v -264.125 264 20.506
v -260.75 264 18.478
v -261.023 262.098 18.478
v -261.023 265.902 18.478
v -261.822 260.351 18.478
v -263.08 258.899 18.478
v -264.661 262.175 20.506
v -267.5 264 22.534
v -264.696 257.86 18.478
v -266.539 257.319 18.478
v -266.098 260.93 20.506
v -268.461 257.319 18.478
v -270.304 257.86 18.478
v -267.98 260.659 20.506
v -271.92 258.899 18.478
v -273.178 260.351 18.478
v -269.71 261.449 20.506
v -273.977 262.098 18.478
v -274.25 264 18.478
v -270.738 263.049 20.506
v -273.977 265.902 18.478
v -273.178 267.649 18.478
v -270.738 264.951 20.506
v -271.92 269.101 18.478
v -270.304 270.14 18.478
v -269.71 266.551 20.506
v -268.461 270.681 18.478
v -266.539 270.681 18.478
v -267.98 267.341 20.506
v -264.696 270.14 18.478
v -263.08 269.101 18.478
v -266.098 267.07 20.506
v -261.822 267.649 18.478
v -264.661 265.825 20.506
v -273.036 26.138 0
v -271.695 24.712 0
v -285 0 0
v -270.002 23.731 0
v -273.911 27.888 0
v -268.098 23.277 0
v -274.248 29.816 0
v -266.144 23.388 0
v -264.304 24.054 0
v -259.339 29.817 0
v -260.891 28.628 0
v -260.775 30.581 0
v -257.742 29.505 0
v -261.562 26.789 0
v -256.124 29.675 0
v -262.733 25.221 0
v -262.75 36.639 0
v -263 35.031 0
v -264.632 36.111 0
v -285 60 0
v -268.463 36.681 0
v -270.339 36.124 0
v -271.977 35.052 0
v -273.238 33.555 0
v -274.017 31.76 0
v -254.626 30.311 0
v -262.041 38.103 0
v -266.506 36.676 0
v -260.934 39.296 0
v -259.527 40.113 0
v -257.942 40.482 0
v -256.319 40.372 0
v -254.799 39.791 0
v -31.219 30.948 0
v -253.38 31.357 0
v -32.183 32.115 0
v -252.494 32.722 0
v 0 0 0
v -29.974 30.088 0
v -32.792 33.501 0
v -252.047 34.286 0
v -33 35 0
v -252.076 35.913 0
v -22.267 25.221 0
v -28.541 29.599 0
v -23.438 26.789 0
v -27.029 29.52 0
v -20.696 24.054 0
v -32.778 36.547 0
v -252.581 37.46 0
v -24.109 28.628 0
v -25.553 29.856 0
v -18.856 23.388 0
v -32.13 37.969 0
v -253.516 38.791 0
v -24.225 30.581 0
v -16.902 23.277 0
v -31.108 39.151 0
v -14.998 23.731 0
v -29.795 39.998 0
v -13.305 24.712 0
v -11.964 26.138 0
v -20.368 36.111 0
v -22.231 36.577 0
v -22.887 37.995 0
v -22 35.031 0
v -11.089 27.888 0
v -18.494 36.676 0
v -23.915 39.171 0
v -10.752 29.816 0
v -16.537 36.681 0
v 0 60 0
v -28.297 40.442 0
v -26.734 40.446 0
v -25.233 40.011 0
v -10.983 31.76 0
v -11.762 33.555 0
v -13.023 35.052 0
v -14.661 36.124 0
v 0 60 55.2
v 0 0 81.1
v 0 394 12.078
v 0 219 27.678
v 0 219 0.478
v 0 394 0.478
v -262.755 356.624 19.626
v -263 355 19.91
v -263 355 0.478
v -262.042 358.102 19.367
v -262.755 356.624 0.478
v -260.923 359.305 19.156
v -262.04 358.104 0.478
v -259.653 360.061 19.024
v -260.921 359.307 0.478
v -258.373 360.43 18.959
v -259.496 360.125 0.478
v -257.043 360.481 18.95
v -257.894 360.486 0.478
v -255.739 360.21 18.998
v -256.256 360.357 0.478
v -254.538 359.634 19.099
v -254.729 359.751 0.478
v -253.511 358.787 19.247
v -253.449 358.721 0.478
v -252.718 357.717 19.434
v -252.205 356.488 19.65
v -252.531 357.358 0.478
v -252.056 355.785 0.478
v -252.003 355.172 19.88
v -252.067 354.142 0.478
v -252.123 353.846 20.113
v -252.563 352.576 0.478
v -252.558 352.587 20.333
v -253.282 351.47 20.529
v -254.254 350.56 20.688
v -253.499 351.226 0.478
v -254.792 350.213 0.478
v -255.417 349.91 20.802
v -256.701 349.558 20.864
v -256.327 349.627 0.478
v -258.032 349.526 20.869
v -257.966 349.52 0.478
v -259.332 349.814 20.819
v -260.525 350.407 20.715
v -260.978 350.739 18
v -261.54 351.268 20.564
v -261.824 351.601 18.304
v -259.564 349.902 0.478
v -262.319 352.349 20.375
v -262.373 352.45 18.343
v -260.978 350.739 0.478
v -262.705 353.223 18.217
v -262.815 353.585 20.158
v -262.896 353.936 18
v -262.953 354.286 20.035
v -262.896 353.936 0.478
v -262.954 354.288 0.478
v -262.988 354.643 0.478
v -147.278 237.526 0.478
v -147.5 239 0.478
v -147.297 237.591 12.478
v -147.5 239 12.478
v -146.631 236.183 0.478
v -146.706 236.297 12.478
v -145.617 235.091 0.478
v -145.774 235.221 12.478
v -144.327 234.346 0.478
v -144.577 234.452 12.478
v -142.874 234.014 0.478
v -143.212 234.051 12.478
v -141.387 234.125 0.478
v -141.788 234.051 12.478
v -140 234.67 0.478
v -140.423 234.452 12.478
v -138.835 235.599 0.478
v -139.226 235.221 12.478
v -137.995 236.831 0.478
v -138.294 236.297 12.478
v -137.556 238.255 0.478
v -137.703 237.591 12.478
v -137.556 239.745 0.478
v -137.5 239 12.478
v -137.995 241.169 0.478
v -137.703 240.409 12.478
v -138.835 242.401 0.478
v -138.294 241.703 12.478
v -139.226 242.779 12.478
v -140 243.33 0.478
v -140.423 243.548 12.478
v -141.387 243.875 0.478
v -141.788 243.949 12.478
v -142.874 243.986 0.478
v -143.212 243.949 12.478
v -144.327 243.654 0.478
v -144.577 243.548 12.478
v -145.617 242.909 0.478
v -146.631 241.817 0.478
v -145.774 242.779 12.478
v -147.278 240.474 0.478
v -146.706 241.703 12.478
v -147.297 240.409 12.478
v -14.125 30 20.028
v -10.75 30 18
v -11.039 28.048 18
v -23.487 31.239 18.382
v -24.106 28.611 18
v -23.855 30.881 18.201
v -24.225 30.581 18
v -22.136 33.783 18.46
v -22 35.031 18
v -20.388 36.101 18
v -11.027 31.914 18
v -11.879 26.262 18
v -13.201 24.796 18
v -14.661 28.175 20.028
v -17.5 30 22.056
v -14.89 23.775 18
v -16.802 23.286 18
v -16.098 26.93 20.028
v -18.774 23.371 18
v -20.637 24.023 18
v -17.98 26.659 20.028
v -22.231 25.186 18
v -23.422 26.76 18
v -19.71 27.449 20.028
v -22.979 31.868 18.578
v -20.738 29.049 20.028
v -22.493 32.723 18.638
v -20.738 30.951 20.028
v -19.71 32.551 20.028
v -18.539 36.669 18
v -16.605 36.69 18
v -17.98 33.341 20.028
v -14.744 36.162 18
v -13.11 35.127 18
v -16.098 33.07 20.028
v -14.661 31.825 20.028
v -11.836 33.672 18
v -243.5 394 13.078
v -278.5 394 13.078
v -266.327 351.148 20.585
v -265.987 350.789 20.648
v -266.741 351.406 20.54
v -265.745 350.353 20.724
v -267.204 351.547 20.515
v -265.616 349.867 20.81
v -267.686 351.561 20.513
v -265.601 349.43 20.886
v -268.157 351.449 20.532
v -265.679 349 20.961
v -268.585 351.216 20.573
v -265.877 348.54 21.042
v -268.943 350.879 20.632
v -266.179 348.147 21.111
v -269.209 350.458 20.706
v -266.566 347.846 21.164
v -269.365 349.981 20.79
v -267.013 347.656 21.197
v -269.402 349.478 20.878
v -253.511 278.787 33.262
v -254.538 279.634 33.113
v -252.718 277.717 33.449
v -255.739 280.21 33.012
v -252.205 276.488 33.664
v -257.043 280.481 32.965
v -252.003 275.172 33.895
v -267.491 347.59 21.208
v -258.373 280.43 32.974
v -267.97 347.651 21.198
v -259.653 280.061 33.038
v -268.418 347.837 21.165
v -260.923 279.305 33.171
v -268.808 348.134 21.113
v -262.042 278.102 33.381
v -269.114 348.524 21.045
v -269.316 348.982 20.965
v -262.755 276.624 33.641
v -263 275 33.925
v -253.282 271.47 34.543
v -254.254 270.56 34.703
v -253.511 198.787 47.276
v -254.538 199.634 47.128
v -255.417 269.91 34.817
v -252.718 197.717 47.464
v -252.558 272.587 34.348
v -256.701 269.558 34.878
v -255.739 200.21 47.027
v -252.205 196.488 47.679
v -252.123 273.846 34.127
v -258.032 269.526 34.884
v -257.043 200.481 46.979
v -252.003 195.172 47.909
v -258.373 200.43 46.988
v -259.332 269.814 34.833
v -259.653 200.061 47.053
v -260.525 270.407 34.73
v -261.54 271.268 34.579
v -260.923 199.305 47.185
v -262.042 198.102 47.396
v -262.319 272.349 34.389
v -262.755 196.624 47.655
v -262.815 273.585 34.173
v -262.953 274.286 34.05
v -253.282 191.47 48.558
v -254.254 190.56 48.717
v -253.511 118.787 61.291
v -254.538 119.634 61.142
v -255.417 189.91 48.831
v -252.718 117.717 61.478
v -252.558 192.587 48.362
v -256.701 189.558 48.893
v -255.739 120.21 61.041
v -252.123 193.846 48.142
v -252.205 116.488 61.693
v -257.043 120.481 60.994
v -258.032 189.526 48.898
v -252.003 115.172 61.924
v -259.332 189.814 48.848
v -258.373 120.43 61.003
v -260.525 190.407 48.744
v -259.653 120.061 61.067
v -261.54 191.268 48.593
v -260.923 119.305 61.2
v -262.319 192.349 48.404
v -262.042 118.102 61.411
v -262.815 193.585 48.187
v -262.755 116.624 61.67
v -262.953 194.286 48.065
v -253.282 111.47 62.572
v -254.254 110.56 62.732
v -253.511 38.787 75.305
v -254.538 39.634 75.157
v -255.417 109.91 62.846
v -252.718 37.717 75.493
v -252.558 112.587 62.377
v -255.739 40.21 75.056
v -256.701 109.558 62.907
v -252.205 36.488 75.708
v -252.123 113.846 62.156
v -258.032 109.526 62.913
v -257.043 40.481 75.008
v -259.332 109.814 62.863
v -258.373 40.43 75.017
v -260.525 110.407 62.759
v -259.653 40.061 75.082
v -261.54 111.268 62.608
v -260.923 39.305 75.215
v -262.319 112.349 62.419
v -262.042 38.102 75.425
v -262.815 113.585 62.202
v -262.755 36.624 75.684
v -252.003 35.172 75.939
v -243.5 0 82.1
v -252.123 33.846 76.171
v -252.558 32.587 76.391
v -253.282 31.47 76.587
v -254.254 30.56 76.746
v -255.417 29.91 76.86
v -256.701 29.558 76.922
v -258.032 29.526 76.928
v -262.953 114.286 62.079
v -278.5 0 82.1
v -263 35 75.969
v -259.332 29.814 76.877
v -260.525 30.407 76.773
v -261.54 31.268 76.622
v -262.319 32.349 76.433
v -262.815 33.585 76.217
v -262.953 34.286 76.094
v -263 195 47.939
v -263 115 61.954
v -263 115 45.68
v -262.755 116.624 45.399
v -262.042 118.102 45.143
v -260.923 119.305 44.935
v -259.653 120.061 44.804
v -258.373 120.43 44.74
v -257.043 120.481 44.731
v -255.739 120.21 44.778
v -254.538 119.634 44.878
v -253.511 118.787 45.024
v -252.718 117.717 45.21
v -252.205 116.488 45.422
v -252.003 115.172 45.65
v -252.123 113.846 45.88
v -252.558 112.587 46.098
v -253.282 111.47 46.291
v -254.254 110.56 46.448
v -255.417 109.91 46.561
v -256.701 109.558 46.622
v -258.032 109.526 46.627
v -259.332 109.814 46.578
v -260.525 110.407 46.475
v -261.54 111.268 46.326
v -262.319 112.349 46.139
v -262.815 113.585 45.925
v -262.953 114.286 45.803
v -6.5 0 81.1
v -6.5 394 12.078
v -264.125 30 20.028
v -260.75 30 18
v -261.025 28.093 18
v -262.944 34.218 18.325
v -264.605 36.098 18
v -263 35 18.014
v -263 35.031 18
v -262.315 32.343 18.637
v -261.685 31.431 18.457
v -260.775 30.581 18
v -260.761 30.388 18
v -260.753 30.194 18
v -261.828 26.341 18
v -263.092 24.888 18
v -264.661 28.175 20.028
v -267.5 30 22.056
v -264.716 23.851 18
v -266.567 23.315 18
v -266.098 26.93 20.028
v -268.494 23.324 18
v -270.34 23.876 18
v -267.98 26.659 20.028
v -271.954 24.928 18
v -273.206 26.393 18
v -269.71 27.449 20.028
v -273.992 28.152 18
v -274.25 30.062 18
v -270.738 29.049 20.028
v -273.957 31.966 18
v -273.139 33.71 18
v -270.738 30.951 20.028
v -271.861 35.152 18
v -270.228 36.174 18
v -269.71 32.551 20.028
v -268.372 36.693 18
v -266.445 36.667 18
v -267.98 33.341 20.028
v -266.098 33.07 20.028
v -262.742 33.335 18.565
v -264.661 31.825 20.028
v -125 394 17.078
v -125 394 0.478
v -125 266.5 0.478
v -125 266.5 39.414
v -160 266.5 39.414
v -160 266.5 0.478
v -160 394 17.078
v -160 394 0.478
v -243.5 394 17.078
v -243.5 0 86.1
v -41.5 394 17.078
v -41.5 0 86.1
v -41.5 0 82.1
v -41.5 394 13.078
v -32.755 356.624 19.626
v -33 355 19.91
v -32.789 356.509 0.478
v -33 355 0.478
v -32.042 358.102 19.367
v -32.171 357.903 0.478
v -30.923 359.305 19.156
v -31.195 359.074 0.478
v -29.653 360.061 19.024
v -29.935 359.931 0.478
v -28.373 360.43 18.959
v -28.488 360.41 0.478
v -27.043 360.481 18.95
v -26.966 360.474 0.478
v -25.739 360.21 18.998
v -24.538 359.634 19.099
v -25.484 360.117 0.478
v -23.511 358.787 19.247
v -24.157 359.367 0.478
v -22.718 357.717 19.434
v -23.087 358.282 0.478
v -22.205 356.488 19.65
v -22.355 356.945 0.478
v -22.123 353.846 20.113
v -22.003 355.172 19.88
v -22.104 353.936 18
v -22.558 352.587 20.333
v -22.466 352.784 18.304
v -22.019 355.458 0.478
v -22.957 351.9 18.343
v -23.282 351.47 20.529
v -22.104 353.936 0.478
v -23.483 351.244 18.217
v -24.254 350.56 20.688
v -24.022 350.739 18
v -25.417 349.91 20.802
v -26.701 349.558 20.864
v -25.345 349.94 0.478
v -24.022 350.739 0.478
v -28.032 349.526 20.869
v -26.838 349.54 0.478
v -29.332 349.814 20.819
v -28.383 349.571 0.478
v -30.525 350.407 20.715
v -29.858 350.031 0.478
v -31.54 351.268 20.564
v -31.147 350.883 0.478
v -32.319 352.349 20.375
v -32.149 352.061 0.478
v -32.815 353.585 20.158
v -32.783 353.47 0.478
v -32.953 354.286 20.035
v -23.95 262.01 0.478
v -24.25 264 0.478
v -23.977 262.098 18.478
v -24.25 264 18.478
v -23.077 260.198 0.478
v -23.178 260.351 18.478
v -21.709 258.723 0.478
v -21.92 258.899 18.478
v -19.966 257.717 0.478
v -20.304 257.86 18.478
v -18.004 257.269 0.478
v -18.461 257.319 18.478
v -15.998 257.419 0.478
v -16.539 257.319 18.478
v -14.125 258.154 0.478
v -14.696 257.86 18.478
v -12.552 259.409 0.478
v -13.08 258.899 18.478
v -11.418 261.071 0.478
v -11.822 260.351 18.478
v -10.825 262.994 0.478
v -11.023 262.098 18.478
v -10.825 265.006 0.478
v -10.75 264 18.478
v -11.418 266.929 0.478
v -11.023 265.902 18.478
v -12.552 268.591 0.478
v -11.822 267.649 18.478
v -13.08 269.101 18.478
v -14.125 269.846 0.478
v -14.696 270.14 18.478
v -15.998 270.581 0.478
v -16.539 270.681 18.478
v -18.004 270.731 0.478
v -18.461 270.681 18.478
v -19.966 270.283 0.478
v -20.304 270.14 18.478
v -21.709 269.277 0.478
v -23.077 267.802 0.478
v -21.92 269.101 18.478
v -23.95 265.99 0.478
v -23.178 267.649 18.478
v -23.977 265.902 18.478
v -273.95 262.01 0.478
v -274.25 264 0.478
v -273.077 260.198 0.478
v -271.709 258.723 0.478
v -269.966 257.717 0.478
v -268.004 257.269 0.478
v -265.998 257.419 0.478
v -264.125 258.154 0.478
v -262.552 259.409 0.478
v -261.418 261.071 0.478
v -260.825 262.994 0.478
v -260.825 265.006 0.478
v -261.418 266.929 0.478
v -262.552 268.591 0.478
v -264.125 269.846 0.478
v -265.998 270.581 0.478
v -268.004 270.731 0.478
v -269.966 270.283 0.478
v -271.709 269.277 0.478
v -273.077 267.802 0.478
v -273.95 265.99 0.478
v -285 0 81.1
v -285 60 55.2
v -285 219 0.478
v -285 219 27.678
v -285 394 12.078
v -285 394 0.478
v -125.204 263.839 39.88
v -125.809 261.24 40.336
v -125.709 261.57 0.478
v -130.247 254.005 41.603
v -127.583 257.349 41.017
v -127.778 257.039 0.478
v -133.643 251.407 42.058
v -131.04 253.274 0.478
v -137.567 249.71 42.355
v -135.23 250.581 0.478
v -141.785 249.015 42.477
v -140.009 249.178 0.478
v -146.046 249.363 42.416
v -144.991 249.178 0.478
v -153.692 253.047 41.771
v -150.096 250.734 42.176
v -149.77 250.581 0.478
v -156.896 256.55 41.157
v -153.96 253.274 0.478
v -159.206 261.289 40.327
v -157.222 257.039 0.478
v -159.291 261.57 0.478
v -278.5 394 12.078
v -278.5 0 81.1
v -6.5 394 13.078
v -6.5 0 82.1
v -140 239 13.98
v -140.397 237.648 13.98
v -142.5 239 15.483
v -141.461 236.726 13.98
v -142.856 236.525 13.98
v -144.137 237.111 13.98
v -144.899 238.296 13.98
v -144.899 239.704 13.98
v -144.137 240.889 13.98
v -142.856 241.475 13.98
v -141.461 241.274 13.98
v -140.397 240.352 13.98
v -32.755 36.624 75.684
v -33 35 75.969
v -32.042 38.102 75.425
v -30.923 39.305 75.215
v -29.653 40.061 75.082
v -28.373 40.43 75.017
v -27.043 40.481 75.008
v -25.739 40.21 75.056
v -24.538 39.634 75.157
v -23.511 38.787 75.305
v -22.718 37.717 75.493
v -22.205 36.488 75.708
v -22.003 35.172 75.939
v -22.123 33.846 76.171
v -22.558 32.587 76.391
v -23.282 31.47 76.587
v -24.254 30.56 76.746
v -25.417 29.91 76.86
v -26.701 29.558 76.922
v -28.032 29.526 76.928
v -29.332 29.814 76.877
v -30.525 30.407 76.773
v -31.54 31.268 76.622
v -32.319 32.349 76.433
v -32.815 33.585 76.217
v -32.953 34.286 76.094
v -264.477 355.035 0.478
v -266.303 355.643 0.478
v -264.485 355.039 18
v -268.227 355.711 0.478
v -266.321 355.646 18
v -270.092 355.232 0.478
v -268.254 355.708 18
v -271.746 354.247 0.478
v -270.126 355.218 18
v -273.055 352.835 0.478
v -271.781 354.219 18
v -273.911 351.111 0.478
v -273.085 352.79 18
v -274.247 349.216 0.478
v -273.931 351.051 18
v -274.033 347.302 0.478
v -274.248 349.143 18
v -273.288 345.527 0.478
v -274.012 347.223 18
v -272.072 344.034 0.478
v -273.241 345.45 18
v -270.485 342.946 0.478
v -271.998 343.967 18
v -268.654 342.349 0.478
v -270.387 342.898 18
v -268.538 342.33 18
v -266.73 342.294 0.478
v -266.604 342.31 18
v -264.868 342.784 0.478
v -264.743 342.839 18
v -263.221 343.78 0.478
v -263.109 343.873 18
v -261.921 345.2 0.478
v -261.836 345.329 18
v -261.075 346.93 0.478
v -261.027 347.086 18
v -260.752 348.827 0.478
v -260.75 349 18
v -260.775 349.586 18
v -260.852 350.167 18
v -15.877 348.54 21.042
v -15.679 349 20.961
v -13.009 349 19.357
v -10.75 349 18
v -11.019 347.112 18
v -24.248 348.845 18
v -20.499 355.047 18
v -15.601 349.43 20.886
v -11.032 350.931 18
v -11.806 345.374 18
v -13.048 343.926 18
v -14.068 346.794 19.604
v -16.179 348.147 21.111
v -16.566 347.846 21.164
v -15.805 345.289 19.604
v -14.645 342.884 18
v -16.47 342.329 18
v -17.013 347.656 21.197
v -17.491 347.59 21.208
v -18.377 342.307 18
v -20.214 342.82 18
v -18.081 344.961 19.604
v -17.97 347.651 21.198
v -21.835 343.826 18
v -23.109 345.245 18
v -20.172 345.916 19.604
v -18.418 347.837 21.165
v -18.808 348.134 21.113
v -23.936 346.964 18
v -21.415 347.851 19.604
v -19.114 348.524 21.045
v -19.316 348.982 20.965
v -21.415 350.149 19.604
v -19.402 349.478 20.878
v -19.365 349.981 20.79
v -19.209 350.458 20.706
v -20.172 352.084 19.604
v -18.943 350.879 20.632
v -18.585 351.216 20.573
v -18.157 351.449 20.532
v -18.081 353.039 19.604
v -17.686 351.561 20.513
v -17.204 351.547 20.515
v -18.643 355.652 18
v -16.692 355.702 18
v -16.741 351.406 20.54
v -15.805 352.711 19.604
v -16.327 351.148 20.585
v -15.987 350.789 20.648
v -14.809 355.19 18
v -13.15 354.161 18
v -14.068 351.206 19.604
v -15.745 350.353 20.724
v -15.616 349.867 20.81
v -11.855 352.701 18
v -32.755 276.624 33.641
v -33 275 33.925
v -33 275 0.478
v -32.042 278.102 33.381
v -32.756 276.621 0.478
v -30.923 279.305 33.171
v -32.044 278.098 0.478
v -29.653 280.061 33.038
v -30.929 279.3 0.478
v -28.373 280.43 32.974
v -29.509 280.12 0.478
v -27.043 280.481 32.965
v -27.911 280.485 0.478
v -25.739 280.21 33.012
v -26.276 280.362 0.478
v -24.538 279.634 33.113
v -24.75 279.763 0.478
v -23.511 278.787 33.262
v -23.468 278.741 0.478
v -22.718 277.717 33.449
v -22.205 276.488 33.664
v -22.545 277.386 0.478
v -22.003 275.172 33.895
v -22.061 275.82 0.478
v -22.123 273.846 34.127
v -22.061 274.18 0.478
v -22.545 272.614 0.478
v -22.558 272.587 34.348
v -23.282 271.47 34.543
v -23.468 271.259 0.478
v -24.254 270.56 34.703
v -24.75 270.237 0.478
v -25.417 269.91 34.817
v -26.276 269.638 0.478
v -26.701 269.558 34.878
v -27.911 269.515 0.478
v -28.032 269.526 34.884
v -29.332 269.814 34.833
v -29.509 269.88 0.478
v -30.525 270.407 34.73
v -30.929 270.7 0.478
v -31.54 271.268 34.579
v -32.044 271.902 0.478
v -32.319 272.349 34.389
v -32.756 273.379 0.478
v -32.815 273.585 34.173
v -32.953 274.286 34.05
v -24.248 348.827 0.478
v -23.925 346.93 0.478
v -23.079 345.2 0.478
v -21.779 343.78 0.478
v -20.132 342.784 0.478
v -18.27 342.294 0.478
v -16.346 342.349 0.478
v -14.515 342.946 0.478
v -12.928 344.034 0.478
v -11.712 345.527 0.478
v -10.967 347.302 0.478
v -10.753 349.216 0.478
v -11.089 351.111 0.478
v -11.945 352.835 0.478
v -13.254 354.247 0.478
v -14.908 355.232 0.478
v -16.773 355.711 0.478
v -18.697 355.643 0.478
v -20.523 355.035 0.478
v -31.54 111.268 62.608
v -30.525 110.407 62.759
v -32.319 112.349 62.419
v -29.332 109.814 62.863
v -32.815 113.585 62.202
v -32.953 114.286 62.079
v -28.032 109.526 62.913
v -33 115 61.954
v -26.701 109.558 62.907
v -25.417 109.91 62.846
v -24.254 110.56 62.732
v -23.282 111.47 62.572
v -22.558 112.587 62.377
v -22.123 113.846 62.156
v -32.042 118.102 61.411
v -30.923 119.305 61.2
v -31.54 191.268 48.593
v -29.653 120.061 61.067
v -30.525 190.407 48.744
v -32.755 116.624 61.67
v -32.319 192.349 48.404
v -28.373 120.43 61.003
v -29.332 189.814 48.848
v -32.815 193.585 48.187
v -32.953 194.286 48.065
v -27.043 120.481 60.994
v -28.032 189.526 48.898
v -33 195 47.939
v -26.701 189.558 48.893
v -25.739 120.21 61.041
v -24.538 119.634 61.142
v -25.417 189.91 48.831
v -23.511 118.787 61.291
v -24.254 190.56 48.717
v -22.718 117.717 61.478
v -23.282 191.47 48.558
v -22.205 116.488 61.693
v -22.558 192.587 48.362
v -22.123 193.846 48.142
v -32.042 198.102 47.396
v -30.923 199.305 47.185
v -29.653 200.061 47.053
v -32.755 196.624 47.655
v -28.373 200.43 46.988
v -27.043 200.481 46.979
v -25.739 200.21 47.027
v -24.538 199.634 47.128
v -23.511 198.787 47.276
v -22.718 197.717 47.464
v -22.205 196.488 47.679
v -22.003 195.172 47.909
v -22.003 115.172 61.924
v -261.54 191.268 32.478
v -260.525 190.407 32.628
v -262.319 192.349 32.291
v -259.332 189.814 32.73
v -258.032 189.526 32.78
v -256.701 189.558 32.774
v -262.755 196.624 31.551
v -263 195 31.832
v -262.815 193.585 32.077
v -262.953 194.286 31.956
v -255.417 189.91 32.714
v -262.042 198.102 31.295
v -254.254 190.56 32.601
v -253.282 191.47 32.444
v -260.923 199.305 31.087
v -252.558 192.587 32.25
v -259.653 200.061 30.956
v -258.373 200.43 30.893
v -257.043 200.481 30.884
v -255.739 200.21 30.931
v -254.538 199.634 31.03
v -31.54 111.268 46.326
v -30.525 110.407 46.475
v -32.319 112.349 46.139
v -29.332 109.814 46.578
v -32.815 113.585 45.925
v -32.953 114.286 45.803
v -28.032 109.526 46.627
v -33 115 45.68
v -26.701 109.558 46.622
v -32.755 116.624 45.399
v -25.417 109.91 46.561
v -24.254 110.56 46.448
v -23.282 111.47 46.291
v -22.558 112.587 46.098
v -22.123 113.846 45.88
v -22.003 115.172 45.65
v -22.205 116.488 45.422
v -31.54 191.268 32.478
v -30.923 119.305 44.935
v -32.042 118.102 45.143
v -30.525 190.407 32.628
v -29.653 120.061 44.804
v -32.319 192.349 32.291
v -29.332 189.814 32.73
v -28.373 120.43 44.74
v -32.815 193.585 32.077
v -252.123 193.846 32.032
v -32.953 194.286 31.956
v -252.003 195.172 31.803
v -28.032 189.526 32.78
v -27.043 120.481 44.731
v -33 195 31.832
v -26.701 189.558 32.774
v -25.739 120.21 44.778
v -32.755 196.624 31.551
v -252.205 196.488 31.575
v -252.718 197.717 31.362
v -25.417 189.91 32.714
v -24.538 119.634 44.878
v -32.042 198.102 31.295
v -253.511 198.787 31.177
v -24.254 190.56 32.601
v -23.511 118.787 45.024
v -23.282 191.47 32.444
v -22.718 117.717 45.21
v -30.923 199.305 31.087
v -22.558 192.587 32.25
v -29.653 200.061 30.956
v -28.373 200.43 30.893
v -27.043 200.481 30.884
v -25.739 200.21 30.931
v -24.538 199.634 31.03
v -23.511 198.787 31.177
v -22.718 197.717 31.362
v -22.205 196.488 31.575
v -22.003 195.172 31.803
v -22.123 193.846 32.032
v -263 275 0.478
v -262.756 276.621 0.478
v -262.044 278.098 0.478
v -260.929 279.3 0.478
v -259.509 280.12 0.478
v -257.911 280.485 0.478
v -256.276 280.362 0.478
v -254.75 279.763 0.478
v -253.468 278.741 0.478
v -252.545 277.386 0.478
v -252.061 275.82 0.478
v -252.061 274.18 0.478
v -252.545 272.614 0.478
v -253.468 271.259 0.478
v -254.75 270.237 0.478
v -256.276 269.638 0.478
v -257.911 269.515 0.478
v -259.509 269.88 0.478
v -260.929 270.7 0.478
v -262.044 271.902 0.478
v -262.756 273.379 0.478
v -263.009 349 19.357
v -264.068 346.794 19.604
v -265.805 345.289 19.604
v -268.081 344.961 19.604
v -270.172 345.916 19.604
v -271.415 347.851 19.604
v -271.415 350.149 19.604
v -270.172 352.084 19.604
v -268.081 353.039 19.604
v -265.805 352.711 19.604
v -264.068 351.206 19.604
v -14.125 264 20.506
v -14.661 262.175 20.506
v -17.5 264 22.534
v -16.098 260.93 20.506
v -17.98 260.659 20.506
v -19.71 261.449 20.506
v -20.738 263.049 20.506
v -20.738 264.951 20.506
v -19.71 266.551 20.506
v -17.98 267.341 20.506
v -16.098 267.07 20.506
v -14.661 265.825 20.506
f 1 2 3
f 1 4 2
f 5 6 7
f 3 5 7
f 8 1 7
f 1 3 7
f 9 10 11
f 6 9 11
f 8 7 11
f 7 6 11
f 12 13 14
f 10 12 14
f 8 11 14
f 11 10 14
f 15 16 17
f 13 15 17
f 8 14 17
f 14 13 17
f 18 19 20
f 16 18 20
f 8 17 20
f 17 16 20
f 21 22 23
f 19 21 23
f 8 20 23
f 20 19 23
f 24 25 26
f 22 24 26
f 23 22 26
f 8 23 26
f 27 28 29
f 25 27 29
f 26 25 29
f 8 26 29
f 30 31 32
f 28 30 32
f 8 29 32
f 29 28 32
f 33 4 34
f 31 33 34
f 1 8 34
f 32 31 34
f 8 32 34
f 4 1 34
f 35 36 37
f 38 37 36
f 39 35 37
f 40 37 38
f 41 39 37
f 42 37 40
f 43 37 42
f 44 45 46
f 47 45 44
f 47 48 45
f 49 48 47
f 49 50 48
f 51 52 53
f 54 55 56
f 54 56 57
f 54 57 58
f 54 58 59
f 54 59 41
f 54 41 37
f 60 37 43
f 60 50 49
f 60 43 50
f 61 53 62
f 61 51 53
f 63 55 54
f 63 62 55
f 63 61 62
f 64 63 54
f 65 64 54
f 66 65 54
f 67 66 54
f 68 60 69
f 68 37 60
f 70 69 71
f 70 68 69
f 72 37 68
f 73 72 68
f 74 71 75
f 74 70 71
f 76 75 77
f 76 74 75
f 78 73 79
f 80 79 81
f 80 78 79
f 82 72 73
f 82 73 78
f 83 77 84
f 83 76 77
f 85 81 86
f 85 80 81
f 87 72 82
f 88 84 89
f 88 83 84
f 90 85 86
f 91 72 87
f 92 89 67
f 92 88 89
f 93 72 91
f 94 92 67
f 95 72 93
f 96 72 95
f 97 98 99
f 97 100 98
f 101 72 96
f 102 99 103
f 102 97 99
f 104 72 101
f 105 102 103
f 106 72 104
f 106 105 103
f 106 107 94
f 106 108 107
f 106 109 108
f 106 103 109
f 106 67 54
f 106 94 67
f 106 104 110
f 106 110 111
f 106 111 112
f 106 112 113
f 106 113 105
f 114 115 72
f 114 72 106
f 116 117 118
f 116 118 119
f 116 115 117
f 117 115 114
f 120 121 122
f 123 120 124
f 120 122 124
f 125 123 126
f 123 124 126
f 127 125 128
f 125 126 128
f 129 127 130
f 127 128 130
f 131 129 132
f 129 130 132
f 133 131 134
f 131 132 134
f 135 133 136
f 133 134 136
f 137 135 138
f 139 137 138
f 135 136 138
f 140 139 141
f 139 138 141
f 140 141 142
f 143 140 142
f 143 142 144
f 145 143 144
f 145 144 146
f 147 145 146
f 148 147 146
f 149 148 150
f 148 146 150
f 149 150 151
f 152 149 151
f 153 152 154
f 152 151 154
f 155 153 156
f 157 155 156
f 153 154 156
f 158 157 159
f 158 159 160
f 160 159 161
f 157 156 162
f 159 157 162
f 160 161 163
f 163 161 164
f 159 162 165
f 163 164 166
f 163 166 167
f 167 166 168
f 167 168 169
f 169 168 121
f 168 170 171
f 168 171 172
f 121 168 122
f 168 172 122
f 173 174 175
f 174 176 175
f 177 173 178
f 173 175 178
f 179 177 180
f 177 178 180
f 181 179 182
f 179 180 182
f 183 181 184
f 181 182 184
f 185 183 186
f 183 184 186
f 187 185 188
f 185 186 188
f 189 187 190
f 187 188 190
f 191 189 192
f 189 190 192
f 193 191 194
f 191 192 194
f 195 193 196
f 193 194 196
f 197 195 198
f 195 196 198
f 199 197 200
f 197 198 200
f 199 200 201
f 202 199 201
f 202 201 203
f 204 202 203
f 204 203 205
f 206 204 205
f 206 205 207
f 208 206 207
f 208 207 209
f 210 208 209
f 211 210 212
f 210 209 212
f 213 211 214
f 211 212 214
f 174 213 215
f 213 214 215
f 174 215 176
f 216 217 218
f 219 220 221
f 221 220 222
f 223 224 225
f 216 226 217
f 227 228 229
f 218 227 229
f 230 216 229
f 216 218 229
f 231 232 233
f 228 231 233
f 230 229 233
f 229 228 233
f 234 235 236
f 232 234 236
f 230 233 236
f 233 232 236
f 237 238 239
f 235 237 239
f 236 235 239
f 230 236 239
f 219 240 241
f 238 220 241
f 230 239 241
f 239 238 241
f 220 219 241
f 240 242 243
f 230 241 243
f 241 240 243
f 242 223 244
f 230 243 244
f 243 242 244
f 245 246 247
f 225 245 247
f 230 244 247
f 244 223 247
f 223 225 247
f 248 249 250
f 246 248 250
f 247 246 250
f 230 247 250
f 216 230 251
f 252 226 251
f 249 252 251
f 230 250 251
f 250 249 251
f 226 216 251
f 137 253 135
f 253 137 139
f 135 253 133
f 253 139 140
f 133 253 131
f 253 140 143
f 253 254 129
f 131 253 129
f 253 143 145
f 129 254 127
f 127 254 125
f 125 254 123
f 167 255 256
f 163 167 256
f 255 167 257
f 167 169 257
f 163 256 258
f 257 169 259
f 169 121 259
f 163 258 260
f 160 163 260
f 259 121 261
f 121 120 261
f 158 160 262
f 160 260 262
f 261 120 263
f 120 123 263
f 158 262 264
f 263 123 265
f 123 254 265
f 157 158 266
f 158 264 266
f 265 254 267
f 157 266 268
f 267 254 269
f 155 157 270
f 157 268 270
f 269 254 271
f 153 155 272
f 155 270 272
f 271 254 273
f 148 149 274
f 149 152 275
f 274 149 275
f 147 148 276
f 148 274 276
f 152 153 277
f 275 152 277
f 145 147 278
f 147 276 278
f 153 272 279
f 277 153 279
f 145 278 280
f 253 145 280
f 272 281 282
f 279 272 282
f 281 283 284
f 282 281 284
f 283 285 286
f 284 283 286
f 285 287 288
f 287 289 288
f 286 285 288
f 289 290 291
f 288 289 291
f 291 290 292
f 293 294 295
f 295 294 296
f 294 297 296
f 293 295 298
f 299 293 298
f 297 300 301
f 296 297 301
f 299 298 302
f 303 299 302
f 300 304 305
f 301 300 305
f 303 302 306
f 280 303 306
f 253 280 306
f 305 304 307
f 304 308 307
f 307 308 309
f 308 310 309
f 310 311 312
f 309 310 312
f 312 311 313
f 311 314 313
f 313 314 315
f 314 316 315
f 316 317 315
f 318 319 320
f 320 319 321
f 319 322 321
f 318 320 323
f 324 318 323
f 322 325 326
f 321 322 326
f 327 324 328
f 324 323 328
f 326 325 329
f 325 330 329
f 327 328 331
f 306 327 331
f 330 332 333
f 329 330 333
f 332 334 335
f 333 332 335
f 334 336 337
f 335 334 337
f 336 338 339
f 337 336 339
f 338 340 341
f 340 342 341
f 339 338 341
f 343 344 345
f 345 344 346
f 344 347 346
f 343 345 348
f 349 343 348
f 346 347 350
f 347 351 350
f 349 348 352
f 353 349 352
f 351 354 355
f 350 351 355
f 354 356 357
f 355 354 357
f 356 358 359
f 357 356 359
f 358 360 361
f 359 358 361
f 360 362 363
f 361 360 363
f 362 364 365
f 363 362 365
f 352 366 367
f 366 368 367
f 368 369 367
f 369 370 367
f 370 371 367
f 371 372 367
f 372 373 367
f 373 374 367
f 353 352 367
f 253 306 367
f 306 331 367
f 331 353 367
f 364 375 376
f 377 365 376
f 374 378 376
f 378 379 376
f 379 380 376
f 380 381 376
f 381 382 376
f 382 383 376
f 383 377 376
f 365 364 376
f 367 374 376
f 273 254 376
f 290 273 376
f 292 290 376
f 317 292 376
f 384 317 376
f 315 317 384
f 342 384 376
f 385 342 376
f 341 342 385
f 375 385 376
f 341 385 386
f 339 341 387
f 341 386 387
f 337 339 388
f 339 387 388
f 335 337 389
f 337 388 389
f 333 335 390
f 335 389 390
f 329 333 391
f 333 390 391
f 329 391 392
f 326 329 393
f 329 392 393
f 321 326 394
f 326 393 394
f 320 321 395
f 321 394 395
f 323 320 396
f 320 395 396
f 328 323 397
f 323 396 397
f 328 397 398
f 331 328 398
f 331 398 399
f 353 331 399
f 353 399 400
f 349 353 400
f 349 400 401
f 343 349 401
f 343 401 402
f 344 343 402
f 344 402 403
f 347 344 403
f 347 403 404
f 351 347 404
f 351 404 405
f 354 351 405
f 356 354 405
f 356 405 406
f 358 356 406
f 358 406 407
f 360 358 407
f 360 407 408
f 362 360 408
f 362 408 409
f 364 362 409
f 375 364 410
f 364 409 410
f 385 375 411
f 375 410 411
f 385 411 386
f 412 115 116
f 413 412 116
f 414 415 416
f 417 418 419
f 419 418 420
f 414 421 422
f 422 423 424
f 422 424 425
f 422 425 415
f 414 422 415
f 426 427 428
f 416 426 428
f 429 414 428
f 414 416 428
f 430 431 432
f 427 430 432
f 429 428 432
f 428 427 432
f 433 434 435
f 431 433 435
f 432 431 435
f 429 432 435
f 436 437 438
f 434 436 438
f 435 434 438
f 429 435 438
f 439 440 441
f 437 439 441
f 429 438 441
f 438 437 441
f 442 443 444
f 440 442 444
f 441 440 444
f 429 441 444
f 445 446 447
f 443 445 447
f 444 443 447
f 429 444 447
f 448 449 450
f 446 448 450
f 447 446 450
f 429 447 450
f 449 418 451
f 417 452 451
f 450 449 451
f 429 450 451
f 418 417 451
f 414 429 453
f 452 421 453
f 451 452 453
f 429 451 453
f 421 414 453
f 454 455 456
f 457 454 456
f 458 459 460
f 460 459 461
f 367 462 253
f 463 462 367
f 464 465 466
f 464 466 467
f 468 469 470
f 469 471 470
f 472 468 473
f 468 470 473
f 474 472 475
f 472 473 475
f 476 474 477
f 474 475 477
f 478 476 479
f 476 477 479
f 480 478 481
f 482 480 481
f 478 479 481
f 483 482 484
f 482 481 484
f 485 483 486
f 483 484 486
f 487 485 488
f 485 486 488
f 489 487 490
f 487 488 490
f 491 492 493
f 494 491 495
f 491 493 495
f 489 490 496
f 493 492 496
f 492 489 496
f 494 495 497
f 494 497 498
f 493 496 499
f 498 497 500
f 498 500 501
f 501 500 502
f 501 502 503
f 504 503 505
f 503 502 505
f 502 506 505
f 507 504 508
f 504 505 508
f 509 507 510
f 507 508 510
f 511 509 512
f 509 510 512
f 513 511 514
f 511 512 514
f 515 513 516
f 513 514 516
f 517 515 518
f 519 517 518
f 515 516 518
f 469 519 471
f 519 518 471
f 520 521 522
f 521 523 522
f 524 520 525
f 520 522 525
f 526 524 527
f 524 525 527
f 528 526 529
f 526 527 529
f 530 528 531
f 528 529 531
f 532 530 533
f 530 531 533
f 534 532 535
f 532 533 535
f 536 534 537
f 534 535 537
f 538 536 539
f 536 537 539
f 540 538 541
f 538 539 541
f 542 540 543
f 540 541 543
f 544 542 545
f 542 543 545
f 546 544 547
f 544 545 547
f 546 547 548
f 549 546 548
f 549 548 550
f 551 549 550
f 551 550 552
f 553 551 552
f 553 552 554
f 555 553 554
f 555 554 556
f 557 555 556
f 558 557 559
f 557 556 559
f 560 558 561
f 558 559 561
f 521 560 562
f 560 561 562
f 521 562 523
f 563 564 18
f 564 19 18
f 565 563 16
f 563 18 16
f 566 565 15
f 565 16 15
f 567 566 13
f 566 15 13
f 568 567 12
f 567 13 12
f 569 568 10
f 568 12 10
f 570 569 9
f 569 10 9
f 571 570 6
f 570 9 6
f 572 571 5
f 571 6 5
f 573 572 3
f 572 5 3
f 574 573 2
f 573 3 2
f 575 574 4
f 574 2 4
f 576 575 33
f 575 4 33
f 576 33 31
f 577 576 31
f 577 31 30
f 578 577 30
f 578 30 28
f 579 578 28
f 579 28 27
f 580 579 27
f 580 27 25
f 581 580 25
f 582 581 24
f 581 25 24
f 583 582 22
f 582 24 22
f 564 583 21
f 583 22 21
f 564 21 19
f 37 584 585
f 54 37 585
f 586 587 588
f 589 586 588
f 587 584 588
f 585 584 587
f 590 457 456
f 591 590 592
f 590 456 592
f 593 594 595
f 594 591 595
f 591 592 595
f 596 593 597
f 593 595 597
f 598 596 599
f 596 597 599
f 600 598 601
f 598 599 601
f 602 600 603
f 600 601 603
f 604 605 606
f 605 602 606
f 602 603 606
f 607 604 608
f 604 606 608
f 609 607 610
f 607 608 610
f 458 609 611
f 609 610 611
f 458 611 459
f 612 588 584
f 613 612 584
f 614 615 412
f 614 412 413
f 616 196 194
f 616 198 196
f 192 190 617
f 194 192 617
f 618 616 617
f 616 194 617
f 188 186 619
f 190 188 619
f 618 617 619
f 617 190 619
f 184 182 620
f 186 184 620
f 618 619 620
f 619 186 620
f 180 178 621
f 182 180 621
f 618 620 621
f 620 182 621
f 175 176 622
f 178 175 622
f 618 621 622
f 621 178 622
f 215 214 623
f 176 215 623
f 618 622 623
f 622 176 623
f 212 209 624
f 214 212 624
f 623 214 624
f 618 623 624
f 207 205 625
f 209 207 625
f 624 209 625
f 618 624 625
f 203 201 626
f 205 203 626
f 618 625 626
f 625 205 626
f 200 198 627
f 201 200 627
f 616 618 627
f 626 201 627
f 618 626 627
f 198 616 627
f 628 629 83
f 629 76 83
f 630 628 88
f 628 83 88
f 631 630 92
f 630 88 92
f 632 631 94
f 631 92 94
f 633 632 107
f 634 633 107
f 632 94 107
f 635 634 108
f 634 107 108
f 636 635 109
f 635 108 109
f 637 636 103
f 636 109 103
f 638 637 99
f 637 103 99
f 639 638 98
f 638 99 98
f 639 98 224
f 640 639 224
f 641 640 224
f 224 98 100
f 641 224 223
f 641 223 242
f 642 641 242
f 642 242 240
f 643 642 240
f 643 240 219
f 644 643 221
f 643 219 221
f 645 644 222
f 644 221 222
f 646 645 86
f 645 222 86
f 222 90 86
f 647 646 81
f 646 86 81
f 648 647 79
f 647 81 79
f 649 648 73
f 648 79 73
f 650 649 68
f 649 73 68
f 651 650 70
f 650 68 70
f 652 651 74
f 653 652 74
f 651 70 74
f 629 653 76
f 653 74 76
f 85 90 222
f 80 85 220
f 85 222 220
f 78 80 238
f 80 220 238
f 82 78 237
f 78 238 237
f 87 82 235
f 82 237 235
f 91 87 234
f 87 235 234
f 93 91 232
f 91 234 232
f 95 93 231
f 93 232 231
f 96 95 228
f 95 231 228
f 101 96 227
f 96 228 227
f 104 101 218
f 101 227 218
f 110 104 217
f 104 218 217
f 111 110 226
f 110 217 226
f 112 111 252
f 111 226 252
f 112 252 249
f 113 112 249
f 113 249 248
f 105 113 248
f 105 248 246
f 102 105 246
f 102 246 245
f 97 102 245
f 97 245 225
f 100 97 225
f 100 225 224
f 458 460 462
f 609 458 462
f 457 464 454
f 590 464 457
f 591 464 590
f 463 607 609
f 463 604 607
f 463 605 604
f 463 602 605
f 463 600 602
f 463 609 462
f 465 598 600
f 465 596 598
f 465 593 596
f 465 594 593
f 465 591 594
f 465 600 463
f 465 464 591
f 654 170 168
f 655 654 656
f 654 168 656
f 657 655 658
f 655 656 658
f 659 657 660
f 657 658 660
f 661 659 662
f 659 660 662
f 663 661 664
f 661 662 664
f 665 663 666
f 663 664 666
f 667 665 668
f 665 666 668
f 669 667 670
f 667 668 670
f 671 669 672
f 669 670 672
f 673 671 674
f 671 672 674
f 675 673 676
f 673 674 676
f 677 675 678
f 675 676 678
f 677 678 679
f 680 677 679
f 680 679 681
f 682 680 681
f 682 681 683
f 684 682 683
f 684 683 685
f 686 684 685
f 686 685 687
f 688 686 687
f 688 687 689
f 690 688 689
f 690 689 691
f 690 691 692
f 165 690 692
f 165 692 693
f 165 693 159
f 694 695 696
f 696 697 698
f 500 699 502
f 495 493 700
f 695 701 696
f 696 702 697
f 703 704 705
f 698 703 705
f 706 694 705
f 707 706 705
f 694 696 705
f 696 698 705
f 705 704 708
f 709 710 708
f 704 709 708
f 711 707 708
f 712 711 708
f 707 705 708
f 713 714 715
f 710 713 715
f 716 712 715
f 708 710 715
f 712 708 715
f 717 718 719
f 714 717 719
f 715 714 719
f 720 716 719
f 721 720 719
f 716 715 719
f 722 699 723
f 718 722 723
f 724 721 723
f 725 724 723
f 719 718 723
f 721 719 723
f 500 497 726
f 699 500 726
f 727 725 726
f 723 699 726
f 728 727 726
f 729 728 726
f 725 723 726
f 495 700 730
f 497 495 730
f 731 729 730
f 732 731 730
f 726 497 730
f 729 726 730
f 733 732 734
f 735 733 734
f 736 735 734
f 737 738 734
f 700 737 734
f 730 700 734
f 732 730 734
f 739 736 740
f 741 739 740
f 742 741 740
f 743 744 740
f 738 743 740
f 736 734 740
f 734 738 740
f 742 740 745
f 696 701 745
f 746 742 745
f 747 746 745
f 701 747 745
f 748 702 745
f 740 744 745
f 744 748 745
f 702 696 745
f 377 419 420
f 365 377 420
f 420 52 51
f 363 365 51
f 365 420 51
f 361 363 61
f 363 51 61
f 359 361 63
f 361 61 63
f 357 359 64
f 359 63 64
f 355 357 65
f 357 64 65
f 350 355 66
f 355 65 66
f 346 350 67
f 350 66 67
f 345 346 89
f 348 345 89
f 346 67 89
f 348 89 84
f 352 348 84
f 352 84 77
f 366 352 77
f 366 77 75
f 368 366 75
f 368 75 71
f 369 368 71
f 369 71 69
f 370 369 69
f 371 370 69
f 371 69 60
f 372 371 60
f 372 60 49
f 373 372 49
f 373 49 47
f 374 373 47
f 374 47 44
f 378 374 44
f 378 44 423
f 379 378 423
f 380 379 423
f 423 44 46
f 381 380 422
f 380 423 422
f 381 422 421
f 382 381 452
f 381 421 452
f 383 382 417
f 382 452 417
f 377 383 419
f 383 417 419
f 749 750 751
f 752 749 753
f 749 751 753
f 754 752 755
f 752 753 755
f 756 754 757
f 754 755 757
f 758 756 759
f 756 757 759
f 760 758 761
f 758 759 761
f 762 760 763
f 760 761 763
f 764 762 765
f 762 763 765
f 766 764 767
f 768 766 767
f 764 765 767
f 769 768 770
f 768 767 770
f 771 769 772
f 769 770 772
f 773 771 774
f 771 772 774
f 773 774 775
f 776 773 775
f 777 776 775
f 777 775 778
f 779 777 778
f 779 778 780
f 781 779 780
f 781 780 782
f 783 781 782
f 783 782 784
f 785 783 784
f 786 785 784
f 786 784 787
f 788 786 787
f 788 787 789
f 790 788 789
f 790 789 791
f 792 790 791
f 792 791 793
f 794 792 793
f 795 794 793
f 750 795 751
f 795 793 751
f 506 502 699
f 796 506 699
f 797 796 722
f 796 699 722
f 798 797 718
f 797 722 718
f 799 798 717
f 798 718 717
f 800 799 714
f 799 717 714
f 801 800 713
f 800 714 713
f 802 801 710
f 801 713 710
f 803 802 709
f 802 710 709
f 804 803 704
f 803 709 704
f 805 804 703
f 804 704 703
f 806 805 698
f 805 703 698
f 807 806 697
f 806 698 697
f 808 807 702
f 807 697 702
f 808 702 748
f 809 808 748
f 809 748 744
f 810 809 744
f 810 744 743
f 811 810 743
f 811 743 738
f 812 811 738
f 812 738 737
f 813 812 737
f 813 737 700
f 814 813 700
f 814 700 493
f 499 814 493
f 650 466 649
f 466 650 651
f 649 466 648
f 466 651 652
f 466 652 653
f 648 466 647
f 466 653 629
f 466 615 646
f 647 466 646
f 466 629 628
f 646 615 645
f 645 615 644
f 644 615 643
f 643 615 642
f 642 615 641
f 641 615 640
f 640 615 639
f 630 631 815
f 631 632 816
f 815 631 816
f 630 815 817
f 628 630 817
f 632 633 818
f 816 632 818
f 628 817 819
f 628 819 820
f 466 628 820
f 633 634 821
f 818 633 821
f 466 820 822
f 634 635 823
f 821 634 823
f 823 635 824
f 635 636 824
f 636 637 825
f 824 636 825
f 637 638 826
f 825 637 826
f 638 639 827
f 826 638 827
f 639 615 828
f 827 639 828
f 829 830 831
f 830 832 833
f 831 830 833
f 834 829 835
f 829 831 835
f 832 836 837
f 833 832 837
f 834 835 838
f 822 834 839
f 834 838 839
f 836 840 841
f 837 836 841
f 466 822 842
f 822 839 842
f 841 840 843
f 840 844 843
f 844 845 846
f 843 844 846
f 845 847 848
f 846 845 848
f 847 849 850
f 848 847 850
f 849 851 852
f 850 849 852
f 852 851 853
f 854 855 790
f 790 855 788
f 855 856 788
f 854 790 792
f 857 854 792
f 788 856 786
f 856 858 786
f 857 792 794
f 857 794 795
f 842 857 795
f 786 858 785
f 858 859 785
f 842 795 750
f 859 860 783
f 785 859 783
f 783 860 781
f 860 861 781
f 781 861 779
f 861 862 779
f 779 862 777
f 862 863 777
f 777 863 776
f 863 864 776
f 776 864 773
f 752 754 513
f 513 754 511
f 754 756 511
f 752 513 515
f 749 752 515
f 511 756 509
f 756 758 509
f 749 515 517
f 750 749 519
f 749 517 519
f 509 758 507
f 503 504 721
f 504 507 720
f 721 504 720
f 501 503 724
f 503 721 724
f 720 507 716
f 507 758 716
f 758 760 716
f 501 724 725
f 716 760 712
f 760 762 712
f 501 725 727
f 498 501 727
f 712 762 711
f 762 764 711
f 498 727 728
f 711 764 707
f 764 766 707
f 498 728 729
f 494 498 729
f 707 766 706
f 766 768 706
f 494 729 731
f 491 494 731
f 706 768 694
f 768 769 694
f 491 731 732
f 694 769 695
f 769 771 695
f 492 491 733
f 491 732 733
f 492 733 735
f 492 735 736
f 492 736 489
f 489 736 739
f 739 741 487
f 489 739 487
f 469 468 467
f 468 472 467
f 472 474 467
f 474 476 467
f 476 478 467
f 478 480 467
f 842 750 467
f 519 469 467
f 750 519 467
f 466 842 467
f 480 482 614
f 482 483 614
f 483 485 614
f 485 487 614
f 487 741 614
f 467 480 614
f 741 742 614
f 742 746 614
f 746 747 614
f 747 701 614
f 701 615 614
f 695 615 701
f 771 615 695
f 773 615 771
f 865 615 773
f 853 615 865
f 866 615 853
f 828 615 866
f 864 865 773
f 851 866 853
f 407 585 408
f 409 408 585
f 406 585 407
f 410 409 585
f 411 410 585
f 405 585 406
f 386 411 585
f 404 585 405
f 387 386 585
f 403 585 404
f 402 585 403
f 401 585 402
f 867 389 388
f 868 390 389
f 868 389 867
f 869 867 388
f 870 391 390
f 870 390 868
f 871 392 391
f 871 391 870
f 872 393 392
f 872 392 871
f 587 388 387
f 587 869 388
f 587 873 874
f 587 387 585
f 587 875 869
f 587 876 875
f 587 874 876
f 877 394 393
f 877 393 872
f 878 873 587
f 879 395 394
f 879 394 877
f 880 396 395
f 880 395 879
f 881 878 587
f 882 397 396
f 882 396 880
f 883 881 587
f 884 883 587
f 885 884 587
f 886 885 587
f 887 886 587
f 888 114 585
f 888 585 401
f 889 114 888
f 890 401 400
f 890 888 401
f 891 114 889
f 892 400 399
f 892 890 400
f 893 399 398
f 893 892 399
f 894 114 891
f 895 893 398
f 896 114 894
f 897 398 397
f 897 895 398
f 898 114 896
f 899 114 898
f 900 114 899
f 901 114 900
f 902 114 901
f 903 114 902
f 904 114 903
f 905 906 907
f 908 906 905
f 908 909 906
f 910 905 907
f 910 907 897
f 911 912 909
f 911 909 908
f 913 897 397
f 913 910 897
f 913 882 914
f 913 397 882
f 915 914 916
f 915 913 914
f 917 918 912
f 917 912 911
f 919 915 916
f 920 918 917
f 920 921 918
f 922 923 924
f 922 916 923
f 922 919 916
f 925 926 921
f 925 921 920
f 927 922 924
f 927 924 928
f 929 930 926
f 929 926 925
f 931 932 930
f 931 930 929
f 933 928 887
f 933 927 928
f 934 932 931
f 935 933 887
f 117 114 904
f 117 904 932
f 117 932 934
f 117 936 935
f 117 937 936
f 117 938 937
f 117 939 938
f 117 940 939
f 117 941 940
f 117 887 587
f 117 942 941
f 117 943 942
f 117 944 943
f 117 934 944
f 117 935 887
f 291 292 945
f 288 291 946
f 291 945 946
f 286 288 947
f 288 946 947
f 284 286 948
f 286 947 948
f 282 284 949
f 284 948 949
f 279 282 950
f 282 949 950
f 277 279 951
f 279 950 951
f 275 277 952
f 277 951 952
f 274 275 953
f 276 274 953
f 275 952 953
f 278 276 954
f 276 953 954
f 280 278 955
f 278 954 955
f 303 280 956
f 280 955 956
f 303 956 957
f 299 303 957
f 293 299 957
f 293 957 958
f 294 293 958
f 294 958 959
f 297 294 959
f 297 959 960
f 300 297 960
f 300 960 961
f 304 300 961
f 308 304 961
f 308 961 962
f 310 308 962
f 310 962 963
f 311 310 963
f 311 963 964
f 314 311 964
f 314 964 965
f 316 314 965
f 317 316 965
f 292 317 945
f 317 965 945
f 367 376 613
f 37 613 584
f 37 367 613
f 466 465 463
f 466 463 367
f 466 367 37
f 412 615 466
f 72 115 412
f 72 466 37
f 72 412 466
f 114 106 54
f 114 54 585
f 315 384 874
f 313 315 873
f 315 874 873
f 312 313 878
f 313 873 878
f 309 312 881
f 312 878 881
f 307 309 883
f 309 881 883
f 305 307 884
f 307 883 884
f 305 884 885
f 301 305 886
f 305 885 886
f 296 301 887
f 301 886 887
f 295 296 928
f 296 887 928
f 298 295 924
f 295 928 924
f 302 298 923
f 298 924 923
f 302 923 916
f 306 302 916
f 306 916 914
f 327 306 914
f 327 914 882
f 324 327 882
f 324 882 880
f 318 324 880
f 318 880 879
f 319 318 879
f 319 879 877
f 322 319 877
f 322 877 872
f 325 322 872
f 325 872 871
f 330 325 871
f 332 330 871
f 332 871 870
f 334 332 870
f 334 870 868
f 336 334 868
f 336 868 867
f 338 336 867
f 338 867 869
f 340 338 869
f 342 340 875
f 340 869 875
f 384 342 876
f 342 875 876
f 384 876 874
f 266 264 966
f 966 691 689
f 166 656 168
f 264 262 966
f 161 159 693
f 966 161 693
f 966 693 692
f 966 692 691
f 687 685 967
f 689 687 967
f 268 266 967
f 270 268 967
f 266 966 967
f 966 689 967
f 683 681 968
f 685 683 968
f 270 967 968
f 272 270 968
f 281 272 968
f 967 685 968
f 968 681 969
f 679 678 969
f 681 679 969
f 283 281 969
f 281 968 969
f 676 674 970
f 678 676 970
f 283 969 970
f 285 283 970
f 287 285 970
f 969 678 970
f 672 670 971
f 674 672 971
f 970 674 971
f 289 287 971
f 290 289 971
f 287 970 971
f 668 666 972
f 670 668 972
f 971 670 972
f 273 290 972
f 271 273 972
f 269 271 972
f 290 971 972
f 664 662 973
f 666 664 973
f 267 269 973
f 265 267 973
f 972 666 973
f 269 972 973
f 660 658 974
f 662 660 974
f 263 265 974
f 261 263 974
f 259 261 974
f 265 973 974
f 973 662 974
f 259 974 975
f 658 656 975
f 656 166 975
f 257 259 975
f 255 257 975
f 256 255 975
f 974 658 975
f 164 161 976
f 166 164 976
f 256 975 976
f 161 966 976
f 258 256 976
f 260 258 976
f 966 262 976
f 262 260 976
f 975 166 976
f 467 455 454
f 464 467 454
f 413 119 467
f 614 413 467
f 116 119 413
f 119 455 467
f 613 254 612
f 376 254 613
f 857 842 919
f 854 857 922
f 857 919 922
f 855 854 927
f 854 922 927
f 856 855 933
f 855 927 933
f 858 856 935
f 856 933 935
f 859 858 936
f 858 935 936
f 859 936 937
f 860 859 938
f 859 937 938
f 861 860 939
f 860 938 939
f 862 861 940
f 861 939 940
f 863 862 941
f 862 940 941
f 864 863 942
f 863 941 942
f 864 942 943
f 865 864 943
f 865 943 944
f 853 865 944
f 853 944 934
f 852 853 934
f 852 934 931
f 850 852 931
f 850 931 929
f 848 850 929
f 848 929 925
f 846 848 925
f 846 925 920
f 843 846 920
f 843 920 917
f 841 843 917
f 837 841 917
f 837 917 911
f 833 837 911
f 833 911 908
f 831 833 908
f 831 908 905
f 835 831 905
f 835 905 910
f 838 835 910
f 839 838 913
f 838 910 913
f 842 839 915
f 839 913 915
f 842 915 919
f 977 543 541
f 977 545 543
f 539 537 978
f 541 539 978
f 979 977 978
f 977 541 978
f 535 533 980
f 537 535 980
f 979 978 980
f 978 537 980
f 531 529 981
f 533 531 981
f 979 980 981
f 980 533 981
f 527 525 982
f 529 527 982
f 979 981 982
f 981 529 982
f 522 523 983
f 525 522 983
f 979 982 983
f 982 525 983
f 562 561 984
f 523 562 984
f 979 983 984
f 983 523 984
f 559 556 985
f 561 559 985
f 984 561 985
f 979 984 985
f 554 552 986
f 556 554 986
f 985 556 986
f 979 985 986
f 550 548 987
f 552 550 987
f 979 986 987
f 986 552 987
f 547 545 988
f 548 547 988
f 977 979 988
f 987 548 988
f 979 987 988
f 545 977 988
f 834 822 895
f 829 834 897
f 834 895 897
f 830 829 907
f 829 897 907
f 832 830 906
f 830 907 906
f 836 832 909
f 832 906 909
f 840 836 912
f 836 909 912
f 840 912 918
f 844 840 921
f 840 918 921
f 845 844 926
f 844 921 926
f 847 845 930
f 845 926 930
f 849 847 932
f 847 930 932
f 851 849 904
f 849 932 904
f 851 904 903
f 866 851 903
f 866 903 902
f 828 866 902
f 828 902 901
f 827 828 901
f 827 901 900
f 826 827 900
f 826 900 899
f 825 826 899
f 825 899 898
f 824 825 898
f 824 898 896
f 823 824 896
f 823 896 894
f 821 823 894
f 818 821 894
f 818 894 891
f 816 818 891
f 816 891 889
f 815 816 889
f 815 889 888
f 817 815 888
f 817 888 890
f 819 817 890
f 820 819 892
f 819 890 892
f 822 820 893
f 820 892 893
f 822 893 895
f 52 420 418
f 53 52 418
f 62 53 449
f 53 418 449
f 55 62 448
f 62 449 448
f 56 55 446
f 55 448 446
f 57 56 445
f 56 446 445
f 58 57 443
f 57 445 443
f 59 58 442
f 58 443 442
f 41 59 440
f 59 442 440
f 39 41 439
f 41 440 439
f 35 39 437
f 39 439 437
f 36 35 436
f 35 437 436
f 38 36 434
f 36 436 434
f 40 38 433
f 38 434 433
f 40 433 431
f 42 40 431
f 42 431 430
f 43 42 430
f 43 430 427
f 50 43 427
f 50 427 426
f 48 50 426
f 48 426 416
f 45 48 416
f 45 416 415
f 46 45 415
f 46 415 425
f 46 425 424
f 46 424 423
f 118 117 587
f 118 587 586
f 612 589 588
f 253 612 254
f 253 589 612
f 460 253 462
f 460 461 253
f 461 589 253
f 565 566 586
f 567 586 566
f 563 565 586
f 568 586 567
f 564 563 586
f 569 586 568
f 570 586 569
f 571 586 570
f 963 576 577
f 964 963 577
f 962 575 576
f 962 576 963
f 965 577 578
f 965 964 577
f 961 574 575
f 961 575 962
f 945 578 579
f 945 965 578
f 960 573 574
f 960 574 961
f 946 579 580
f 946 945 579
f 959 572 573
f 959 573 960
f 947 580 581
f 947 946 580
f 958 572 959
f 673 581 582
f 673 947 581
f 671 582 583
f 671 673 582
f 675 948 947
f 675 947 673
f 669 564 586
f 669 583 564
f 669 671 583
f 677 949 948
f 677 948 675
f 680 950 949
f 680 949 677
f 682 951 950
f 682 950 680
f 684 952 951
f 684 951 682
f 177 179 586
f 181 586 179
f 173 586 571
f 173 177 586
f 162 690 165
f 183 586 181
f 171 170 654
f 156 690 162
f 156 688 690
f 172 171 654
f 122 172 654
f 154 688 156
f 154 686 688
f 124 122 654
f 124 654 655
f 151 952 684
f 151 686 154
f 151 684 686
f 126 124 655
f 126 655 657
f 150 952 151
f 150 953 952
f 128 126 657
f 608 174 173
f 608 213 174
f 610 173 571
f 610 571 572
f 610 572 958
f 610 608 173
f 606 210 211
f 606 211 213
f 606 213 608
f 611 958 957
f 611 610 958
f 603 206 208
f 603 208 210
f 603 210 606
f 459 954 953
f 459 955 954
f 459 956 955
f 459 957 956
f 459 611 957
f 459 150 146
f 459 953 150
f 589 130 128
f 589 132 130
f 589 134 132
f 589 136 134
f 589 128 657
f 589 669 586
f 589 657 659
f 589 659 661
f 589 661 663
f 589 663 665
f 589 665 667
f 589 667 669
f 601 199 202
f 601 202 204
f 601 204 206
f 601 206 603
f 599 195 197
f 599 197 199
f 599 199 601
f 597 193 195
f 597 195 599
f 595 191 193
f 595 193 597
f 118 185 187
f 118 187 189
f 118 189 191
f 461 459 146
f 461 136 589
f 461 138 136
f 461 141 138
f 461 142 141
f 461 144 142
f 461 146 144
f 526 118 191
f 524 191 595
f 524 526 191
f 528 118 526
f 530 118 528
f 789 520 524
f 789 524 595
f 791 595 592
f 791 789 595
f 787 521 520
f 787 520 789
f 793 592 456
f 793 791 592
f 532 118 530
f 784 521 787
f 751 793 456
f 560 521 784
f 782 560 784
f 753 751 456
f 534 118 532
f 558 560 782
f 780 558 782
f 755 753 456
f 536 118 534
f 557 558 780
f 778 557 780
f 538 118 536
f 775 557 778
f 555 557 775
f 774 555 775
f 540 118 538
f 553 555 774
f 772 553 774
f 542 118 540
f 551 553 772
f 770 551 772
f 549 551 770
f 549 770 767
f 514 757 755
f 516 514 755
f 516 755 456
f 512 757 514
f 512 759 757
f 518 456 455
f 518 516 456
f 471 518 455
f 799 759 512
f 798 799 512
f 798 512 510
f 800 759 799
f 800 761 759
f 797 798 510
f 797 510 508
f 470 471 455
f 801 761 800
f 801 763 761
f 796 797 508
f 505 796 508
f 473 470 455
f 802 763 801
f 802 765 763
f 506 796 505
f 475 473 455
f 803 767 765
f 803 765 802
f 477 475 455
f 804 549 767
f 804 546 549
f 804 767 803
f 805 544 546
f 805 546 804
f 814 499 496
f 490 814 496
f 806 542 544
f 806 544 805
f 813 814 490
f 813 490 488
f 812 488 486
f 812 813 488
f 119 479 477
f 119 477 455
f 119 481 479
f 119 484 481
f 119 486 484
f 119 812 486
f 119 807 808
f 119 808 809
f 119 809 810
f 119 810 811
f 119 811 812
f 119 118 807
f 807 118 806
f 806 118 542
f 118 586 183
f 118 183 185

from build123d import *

# Parameters (mm, degrees)
F1_DEPTH  = 285
F3_DEPTH  = 41.5
F5_DEPTH  = 6.5
F7_DEPTH  = 41.5
F8_DEPTH  = 6.5
F13_D     = 11
F15_D     = 13.5
F15_DEPTH = 18
F15_START = 0.4782643
F15_TIP   = 4.0558091784
F17_DEPTH = 85.6227357069
F19_D     = 10
F19_DEPTH = 12
F19_TIP   = 3.0043030951


# Not quite as in the source:
# - a feature names something its author has since deleted; it is built from what else it names


with BuildPart() as f1:
    # F0 (on Right) → F1 (new body)
    with BuildSketch(Plane.YZ):
        Polygon((60, 55.2), (0, 65.8), (0, 0), (60, 0), align=None)
        Polygon((394, 17.0782642931), (0, 86.1), (0, 65.8), (60, 55.2), (219, 27.6782642931), (219, 0.4782642931), (394, 0.4782642931), align=None)
    extrude(amount=-F1_DEPTH)

    # F2 (on face) → F3 (cut)
    with BuildSketch(Plane.YZ):
        Polygon((394, 17.0782642931), (0, 86.1), (0, 82.1), (394, 13.0782642931), align=None)
    extrude(amount=-F3_DEPTH, mode=Mode.SUBTRACT)

    # F4 (on face) → F5 (cut)
    with BuildSketch(Plane.YZ):
        Polygon((394, 13.0782642931), (0, 82.1), (0, 81.1), (394, 12.0782642931), align=None)
    extrude(amount=-F5_DEPTH, mode=Mode.SUBTRACT)

    # F6 (on face) → F7 (cut)
    with BuildSketch(Plane(origin=(-285, 0, 0), x_dir=(0, -1, 0), z_dir=(-1, 0, 0))):
        Polygon((0, 86.1), (-394, 17.0782642931), (-394, 13.0782642931), (0, 82.1), align=None)
    extrude(amount=-F7_DEPTH, mode=Mode.SUBTRACT)

    # F6 (on face) → F8 (cut)
    with BuildSketch(Plane(origin=(-285, 0, 0), x_dir=(0, -1, 0), z_dir=(-1, 0, 0))):
        Polygon((0, 82.1), (-394, 13.0782642931), (-394, 12.0782642931), (0, 81.1), align=None)
    extrude(amount=-F8_DEPTH, mode=Mode.SUBTRACT)

    # F13 (through all)
    with Locations(Plane.XY.offset(86.1)):
        with Locations((-257.5, 355), (-257.5, 275), (-257.5, 195), (-27.5, 355), (-27.5, 275), (-27.5, 195), (-27.5, 115), (-27.5, 35), (-257.5, 115), (-257.5, 35)):
            Hole(F13_D / 2)

    # F15
    # its depths count from where the whole tool has entered the part; down to there all is cleared
    with Locations(Plane(origin=(0, 0, 0), x_dir=(1, 0, 0), z_dir=(0, 0, -1))):
        with Locations((-17.5, -349, 0), (-17.5, -264, -F15_START), (-17.5, -30, 0), (-267.5, -30, 0), (-267.5, -264, -F15_START), (-267.5, -349, 0)):
            Hole(F15_D / 2, depth=F15_DEPTH)
            with Locations((0, 0, -(F15_DEPTH + F15_TIP / 2))):  # 118° drill point
                Cone(0, F15_D / 2, F15_TIP, mode=Mode.SUBTRACT)

    # F16 (on face) → F17 (cut, through all)
    with BuildSketch(Plane(origin=(0, 0, 0.4782642931), x_dir=(1, 0, 0), z_dir=(0, 0, -1))):
        with BuildLine():
            Line((-160, -394), (-125, -394))
            Line((-125, -394), (-125, -266.5))
            ThreePointArc((-125, -266.5), (-142.5, -249), (-160, -266.5))
            Line((-160, -266.5), (-160, -394))
        make_face()
    extrude(amount=-F17_DEPTH, mode=Mode.SUBTRACT)

    # F19
    with Locations(Plane(origin=(0, 0, 0.4782642931), x_dir=(1, 0, 0), z_dir=(0, 0, -1))):
        with Locations((-142.5, -239)):
            Hole(F19_D / 2, depth=F19_DEPTH)
            with Locations((0, 0, -(F19_DEPTH + F19_TIP / 2))):  # 118° drill point
                Cone(0, F19_D / 2, F19_TIP, mode=Mode.SUBTRACT)


solid = f1.part
